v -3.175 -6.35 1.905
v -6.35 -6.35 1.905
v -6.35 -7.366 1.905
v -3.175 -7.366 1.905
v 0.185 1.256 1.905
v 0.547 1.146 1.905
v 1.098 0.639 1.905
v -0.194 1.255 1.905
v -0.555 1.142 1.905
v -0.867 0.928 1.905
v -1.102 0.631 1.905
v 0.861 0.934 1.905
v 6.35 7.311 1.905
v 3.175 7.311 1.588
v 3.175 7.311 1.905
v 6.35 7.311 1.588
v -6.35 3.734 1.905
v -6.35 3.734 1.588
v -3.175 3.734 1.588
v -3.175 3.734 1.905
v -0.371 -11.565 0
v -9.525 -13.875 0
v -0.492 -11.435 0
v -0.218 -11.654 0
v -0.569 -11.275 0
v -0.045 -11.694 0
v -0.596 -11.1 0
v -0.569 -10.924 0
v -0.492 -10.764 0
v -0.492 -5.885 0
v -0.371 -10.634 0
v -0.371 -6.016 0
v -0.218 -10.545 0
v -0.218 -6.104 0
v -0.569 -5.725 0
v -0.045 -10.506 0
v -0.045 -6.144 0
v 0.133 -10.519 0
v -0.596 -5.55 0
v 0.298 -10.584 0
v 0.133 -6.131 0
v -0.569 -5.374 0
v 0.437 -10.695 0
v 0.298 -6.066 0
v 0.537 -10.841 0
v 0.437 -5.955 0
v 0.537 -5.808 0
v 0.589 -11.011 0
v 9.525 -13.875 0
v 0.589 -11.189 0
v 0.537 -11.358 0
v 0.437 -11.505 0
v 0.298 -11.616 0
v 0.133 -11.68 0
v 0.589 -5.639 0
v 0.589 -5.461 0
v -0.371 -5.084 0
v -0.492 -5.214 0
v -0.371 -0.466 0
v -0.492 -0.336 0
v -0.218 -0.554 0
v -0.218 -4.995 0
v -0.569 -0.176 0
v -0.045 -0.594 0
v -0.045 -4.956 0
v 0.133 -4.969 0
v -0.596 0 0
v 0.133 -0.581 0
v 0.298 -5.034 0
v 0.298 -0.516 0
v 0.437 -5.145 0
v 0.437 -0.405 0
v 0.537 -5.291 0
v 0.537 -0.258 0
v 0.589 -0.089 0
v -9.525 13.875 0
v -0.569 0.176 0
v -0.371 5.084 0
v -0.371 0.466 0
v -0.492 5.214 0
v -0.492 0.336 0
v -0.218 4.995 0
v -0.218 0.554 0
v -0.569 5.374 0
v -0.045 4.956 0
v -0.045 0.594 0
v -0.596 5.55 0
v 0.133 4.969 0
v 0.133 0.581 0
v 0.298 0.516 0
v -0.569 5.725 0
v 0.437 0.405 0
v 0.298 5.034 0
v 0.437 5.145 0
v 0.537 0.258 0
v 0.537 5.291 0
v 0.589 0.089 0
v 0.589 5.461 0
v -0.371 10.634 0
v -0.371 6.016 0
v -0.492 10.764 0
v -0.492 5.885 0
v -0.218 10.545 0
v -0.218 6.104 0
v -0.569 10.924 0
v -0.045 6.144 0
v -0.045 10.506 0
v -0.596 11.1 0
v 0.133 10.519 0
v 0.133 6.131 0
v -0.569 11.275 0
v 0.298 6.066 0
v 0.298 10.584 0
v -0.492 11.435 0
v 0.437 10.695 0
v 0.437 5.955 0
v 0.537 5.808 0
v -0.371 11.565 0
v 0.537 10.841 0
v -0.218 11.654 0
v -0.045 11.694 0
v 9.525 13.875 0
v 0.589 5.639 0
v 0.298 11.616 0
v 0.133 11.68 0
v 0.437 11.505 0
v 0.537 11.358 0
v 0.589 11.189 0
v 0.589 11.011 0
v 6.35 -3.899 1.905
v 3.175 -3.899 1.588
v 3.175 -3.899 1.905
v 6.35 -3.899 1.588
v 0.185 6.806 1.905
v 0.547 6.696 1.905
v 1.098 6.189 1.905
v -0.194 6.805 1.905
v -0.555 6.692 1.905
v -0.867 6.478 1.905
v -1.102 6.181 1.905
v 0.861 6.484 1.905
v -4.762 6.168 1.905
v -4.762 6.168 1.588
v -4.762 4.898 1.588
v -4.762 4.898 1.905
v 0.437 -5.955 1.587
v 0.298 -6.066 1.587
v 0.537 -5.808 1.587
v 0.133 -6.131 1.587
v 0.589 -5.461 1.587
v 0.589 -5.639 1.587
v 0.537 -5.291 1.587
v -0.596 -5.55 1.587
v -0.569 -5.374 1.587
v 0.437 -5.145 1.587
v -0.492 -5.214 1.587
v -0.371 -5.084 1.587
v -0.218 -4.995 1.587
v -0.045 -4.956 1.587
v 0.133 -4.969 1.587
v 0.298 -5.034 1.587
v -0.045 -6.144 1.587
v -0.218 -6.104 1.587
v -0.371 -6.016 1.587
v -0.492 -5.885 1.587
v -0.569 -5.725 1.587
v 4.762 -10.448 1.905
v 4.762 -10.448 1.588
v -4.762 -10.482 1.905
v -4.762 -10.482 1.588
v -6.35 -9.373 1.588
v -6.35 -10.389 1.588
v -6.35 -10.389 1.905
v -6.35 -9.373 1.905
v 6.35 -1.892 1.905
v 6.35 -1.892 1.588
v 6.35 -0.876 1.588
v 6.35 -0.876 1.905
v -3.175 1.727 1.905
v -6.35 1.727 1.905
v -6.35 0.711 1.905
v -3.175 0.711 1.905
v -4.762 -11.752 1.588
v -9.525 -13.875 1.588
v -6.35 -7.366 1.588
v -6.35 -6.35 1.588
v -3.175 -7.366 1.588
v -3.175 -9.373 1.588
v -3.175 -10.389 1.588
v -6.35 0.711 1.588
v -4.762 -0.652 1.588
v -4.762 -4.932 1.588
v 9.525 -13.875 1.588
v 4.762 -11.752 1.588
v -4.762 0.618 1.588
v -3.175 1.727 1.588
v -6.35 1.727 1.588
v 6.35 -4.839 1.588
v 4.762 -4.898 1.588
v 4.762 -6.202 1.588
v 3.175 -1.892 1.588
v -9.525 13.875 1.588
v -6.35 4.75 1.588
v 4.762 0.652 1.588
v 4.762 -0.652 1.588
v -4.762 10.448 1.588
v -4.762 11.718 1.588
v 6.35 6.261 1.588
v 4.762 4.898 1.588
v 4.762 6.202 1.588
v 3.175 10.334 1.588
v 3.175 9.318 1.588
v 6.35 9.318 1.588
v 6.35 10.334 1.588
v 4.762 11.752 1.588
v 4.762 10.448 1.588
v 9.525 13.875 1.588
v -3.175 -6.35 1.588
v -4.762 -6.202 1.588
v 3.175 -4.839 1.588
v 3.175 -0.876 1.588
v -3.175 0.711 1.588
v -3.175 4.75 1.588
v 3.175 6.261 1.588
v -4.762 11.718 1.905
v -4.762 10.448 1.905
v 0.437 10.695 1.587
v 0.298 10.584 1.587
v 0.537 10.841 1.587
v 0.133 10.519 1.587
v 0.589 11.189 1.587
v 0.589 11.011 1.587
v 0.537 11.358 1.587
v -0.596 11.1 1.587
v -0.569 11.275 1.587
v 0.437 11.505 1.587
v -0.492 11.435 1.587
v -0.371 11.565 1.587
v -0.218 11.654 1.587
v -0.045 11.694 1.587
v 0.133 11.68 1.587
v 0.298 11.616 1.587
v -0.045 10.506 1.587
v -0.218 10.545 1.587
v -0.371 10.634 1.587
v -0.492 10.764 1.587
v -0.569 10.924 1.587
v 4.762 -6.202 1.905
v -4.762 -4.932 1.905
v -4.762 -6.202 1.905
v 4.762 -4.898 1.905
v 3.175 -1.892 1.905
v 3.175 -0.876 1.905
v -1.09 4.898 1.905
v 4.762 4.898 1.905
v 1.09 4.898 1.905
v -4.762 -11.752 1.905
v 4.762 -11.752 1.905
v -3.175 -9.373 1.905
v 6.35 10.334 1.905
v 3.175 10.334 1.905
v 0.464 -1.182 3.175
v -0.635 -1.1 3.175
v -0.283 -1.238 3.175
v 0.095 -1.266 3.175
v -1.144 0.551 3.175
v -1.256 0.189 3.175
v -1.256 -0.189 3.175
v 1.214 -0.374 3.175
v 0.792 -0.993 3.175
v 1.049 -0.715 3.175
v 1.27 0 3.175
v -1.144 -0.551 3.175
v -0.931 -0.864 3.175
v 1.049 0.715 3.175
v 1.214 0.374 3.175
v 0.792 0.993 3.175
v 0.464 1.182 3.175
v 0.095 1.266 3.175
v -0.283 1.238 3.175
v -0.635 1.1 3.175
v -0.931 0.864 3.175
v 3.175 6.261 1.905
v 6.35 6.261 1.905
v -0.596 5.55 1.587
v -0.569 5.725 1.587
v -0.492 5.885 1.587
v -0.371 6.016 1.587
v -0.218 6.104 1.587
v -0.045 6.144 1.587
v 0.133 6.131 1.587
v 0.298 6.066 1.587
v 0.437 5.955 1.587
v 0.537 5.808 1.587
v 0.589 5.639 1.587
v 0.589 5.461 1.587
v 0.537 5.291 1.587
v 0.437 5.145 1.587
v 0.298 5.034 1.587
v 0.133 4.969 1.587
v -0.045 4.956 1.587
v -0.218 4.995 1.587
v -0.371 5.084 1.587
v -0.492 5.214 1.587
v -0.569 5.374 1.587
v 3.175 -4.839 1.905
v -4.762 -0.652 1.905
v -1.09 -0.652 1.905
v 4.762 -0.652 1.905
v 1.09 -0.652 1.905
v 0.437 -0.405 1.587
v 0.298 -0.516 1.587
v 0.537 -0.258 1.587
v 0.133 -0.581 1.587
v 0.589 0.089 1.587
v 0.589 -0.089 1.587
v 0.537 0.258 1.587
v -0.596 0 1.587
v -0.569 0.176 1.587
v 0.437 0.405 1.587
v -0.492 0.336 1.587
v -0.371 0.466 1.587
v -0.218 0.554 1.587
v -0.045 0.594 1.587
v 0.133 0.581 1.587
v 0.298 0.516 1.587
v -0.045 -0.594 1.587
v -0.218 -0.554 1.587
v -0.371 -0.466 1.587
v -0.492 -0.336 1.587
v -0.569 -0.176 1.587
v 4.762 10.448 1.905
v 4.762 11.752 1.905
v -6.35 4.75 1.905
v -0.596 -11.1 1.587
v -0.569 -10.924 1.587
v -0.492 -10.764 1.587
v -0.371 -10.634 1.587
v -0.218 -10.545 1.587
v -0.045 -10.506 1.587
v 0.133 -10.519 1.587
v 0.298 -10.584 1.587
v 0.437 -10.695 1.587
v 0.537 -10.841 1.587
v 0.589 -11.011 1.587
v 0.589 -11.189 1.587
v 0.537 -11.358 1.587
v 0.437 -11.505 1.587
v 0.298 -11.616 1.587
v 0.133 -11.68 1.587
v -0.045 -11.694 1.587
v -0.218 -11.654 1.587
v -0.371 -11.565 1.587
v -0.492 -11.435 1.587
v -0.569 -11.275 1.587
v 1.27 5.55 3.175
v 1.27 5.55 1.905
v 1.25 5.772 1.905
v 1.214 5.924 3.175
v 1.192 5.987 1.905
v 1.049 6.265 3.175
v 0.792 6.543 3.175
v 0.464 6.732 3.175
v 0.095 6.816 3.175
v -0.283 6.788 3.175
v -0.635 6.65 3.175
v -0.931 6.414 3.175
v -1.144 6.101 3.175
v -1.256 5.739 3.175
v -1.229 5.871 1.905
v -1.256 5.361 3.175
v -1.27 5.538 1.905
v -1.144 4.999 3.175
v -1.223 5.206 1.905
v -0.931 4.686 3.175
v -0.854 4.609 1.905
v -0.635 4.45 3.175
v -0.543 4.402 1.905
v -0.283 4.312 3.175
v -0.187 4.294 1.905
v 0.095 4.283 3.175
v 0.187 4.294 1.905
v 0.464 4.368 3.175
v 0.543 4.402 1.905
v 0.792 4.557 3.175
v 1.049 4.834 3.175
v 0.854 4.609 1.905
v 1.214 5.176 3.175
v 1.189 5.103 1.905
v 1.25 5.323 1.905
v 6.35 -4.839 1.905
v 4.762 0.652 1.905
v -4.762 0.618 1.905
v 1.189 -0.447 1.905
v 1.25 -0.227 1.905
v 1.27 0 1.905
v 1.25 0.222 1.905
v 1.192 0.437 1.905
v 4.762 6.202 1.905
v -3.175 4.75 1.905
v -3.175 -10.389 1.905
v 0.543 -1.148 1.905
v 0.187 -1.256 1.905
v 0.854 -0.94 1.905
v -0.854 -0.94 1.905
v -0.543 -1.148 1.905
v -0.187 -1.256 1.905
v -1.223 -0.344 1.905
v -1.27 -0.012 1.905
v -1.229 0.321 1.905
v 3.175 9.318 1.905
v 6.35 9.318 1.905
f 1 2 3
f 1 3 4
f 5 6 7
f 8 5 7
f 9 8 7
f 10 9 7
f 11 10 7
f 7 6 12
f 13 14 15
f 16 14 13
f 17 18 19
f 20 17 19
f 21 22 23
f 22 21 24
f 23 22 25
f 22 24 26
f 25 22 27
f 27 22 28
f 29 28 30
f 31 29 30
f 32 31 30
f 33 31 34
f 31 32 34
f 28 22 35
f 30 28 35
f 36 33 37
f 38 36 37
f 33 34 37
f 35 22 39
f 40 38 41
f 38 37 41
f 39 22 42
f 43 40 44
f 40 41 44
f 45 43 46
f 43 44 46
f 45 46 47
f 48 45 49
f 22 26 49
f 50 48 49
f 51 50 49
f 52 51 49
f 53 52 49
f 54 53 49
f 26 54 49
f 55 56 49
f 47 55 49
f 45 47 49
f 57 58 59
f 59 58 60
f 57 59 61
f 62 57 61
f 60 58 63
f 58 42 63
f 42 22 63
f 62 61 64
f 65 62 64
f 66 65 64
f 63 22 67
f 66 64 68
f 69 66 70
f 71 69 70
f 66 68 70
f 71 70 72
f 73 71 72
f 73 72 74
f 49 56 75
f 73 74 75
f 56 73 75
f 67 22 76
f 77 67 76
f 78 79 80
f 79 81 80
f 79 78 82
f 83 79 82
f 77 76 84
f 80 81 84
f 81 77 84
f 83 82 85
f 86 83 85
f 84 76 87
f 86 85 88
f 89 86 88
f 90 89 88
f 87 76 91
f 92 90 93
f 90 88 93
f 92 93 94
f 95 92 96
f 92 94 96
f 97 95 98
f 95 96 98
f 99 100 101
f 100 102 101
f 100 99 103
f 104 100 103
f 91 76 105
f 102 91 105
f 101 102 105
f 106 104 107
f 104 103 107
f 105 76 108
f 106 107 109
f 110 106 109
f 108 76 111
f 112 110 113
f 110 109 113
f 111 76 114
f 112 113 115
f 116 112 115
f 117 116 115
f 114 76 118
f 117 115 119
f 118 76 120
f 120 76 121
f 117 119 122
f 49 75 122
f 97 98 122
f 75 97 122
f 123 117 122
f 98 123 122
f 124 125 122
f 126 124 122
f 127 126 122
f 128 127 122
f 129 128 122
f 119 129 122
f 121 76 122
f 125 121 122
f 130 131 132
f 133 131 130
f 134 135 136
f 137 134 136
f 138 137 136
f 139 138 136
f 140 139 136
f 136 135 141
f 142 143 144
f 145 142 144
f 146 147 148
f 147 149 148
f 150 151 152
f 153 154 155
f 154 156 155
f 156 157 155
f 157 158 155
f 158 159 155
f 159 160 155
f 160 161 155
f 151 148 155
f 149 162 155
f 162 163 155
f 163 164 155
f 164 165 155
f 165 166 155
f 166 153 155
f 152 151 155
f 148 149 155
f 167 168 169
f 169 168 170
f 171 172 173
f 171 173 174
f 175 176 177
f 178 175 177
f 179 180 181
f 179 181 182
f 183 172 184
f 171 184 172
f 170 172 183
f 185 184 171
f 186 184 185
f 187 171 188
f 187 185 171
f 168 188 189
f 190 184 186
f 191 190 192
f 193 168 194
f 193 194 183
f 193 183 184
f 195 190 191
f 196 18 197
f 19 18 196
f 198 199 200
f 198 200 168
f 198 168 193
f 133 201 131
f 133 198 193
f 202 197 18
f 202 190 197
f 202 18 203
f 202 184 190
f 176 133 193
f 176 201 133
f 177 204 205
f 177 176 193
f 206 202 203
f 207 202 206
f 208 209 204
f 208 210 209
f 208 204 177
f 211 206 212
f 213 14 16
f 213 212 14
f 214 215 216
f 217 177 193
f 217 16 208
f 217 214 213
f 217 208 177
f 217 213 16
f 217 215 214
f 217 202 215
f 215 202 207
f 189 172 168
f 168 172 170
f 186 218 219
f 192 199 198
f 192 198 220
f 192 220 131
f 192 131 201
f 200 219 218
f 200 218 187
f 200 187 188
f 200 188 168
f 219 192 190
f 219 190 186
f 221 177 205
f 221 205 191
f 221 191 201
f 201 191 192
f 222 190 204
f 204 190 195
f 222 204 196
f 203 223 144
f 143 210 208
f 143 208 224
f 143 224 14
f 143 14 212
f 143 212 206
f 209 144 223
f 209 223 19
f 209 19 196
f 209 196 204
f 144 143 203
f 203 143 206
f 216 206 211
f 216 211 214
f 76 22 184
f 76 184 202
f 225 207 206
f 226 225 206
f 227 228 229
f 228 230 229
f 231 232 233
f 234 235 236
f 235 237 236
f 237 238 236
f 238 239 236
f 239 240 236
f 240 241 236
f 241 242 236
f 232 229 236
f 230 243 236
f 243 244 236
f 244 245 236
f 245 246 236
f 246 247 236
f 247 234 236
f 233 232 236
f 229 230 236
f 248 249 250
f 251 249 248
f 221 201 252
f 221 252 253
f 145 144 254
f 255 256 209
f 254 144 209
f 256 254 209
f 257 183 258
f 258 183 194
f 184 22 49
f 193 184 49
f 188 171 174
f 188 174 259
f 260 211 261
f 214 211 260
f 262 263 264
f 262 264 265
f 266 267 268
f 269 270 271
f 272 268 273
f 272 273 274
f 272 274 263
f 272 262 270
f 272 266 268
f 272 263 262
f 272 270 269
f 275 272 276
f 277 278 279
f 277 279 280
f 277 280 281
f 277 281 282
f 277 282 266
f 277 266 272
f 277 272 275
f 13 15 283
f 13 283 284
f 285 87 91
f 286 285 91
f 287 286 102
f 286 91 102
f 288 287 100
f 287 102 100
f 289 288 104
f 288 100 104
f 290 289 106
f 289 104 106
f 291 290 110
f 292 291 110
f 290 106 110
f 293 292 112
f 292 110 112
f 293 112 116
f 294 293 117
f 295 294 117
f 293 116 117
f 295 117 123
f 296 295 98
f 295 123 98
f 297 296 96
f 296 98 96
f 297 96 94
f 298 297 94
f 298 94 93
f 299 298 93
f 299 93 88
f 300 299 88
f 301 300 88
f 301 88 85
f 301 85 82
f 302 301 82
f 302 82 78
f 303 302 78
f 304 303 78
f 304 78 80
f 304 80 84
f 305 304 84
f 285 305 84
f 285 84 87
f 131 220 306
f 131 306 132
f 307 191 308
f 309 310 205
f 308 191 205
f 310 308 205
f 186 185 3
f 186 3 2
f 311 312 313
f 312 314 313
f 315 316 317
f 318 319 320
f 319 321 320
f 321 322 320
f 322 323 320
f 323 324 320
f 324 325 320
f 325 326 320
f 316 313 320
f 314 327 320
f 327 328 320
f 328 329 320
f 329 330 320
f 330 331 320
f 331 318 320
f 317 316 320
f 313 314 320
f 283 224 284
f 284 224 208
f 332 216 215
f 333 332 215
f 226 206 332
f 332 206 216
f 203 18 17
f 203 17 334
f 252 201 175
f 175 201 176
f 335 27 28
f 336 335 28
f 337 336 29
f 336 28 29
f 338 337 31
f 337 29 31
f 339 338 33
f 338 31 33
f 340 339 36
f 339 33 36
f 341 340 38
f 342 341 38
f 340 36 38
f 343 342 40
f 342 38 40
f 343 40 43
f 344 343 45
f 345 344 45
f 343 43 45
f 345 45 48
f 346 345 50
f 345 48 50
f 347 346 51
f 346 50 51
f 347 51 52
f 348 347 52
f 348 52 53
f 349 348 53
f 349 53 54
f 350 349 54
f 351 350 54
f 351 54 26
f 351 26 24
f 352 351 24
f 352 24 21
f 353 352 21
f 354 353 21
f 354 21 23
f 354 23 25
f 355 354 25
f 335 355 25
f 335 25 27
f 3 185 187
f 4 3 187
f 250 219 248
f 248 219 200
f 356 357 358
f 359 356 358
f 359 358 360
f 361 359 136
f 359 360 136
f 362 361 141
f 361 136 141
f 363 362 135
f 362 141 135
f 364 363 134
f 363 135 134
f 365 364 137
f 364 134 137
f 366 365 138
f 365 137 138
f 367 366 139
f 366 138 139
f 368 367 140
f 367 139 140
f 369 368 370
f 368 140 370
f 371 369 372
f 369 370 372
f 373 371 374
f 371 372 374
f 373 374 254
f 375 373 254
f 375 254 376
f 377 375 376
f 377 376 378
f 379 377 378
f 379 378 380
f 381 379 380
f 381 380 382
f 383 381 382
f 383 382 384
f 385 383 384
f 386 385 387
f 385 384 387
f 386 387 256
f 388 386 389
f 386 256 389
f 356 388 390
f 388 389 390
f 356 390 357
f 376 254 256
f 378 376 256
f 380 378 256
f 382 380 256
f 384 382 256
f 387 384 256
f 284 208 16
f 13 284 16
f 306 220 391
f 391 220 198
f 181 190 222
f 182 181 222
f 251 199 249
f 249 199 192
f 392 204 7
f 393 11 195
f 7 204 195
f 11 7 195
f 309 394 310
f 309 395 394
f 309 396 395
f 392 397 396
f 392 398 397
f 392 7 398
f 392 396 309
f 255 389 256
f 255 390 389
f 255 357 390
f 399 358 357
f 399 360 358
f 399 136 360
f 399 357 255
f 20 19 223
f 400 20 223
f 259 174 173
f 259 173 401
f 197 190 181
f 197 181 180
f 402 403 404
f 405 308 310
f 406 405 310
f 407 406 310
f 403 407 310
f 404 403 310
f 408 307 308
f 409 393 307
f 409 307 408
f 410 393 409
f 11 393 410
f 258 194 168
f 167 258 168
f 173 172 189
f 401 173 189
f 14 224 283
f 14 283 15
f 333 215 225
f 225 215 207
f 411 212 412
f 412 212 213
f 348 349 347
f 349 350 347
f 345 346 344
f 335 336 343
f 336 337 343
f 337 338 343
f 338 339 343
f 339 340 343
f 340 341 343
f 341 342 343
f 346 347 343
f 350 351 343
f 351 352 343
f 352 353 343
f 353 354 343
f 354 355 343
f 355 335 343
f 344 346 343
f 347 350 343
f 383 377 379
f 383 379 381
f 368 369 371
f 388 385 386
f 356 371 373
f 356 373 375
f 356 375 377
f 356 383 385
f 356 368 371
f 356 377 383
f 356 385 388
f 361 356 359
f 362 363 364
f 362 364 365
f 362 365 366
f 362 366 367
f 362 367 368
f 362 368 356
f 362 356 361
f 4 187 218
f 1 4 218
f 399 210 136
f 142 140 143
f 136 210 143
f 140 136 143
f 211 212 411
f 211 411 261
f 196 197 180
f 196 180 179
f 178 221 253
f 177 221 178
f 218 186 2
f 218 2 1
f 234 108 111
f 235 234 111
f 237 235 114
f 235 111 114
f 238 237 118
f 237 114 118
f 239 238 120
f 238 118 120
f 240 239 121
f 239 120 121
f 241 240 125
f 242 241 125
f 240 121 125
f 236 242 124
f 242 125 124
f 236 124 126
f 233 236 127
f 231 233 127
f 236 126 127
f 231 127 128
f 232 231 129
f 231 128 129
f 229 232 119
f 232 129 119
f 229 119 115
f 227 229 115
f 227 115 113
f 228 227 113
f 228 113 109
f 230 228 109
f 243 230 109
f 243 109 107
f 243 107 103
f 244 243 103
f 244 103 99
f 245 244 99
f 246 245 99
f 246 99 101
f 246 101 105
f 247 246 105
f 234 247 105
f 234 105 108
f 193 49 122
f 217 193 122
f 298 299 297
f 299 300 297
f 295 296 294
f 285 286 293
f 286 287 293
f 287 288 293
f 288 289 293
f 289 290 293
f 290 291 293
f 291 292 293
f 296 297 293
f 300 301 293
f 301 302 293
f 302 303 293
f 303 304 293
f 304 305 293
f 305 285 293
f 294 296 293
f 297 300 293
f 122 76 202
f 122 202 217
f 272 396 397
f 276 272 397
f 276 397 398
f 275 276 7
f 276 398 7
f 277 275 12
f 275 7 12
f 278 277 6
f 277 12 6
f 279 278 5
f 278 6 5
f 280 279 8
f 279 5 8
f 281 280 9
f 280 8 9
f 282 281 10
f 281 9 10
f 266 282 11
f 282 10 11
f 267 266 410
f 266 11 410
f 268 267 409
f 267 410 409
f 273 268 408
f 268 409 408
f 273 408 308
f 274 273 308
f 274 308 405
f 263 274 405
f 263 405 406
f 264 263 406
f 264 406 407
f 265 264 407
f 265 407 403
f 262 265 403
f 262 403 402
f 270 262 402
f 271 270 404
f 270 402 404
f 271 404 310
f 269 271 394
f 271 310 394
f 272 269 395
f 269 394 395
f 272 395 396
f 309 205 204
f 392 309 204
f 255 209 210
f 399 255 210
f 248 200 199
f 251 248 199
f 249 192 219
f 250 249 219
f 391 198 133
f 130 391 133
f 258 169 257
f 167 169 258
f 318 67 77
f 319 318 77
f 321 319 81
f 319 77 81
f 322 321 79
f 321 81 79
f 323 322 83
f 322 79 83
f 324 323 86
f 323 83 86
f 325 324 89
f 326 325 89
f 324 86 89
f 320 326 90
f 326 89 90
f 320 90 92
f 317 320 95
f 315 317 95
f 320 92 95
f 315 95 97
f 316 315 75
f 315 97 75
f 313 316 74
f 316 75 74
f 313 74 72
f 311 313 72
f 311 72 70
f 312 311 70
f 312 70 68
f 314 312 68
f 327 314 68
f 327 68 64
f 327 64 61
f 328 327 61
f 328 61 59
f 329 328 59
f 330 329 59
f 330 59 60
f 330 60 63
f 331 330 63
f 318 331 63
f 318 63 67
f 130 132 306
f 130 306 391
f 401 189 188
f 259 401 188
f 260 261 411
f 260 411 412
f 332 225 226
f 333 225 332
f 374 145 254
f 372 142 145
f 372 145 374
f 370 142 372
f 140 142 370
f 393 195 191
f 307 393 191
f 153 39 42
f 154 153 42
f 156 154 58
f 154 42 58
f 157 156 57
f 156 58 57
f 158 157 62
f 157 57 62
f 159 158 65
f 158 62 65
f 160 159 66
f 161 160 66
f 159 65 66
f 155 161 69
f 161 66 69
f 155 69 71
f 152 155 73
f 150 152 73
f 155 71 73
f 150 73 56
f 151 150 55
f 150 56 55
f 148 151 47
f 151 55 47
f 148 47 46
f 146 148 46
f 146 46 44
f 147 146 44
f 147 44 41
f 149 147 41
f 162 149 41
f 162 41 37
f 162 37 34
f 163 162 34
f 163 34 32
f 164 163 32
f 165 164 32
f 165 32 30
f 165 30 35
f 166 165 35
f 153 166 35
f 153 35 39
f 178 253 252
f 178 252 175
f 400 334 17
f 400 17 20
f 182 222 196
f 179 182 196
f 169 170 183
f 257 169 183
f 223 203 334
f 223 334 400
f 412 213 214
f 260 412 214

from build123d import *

# Parameters (mm, degrees)
SKETCH1_W             = 19.05
SKETCH1_H             = 27.7495
BOSS_EXTRUDE1_DEPTH   = 1.5875
F_0_80_TAPPED_HOLE1_D = 1.19126
SKETCH4_W             = 3.175
SKETCH4_H             = 0.9398
SKETCH4_H_2           = 1.016
SKETCH4_H_3           = 1.050029844
BOSS_EXTRUDE2_DEPTH   = 0.3175
BOSS_EXTRUDE3_DEPTH   = 0.3175
LPATTERN1_COUNT       = 5
LPATTERN1_PITCH       = 5.5499
SKETCH8_R             = 1.27
BOSS_EXTRUDE4_DEPTH   = 1.27


with BuildPart() as part:
    # Sketch1 → Boss-Extrude1 (new body)
    with BuildSketch(Plane.XY):
        Rectangle(SKETCH1_W, SKETCH1_H)
    extrude(amount=BOSS_EXTRUDE1_DEPTH)

    # #0-80 Tapped Hole1 (through all)
    with Locations(Plane.XY.offset(1.5875)):
        with Locations((0, -11.0998), (0, -5.5499), (0, 0), (0, 5.5499), (0, 11.0998)):
            Hole(F_0_80_TAPPED_HOLE1_D / 2)

    # Sketch4 → Boss-Extrude2 (add)
    with BuildSketch(Plane.XY.offset(1.5875)):
        with Locations((4.7625, -4.3688)):
            Rectangle(SKETCH4_W, SKETCH4_H)
        with Locations((-4.7625, -9.8806)):
            Rectangle(SKETCH4_W, SKETCH4_H_2)
        with Locations((-4.7625, -6.858)):
            Rectangle(SKETCH4_W, SKETCH4_H_2)
        with Locations((4.7625, -1.3843)):
            Rectangle(SKETCH4_W, SKETCH4_H_2)
        with Locations((-4.7625, 1.2192)):
            Rectangle(SKETCH4_W, SKETCH4_H_2)
        with Locations((-4.7625, 4.2418)):
            Rectangle(SKETCH4_W, SKETCH4_H_2)
        with Locations((4.7625, 6.786114922)):
            Rectangle(SKETCH4_W, SKETCH4_H_3)
        with Locations((4.7625, 9.825729844)):
            Rectangle(SKETCH4_W, SKETCH4_H_2)
    extrude(amount=BOSS_EXTRUDE2_DEPTH)

    # Sketch6 → Boss-Extrude3 (add)
    with BuildSketch(Plane.XY.offset(1.5875)):
        Polygon((4.7625, -10.447923864), (-4.7625, -10.481668166), (-4.7625, -11.751668166), (4.7625, -11.751668166), align=None)
    boss_extrude3 = extrude(amount=BOSS_EXTRUDE3_DEPTH)

    # LPattern1: Boss-Extrude3 ×5
    with Locations(*[(0, i * LPATTERN1_PITCH, 0) for i in range(1, LPATTERN1_COUNT)]):
        add(boss_extrude3)

    # Sketch8 → Boss-Extrude4 (add)
    with BuildSketch(Plane.XY.offset(1.905)):
        Circle(SKETCH8_R)
        with Locations((0, 5.5499)):
            Circle(SKETCH8_R)
    extrude(amount=BOSS_EXTRUDE4_DEPTH)


solid = part.part
